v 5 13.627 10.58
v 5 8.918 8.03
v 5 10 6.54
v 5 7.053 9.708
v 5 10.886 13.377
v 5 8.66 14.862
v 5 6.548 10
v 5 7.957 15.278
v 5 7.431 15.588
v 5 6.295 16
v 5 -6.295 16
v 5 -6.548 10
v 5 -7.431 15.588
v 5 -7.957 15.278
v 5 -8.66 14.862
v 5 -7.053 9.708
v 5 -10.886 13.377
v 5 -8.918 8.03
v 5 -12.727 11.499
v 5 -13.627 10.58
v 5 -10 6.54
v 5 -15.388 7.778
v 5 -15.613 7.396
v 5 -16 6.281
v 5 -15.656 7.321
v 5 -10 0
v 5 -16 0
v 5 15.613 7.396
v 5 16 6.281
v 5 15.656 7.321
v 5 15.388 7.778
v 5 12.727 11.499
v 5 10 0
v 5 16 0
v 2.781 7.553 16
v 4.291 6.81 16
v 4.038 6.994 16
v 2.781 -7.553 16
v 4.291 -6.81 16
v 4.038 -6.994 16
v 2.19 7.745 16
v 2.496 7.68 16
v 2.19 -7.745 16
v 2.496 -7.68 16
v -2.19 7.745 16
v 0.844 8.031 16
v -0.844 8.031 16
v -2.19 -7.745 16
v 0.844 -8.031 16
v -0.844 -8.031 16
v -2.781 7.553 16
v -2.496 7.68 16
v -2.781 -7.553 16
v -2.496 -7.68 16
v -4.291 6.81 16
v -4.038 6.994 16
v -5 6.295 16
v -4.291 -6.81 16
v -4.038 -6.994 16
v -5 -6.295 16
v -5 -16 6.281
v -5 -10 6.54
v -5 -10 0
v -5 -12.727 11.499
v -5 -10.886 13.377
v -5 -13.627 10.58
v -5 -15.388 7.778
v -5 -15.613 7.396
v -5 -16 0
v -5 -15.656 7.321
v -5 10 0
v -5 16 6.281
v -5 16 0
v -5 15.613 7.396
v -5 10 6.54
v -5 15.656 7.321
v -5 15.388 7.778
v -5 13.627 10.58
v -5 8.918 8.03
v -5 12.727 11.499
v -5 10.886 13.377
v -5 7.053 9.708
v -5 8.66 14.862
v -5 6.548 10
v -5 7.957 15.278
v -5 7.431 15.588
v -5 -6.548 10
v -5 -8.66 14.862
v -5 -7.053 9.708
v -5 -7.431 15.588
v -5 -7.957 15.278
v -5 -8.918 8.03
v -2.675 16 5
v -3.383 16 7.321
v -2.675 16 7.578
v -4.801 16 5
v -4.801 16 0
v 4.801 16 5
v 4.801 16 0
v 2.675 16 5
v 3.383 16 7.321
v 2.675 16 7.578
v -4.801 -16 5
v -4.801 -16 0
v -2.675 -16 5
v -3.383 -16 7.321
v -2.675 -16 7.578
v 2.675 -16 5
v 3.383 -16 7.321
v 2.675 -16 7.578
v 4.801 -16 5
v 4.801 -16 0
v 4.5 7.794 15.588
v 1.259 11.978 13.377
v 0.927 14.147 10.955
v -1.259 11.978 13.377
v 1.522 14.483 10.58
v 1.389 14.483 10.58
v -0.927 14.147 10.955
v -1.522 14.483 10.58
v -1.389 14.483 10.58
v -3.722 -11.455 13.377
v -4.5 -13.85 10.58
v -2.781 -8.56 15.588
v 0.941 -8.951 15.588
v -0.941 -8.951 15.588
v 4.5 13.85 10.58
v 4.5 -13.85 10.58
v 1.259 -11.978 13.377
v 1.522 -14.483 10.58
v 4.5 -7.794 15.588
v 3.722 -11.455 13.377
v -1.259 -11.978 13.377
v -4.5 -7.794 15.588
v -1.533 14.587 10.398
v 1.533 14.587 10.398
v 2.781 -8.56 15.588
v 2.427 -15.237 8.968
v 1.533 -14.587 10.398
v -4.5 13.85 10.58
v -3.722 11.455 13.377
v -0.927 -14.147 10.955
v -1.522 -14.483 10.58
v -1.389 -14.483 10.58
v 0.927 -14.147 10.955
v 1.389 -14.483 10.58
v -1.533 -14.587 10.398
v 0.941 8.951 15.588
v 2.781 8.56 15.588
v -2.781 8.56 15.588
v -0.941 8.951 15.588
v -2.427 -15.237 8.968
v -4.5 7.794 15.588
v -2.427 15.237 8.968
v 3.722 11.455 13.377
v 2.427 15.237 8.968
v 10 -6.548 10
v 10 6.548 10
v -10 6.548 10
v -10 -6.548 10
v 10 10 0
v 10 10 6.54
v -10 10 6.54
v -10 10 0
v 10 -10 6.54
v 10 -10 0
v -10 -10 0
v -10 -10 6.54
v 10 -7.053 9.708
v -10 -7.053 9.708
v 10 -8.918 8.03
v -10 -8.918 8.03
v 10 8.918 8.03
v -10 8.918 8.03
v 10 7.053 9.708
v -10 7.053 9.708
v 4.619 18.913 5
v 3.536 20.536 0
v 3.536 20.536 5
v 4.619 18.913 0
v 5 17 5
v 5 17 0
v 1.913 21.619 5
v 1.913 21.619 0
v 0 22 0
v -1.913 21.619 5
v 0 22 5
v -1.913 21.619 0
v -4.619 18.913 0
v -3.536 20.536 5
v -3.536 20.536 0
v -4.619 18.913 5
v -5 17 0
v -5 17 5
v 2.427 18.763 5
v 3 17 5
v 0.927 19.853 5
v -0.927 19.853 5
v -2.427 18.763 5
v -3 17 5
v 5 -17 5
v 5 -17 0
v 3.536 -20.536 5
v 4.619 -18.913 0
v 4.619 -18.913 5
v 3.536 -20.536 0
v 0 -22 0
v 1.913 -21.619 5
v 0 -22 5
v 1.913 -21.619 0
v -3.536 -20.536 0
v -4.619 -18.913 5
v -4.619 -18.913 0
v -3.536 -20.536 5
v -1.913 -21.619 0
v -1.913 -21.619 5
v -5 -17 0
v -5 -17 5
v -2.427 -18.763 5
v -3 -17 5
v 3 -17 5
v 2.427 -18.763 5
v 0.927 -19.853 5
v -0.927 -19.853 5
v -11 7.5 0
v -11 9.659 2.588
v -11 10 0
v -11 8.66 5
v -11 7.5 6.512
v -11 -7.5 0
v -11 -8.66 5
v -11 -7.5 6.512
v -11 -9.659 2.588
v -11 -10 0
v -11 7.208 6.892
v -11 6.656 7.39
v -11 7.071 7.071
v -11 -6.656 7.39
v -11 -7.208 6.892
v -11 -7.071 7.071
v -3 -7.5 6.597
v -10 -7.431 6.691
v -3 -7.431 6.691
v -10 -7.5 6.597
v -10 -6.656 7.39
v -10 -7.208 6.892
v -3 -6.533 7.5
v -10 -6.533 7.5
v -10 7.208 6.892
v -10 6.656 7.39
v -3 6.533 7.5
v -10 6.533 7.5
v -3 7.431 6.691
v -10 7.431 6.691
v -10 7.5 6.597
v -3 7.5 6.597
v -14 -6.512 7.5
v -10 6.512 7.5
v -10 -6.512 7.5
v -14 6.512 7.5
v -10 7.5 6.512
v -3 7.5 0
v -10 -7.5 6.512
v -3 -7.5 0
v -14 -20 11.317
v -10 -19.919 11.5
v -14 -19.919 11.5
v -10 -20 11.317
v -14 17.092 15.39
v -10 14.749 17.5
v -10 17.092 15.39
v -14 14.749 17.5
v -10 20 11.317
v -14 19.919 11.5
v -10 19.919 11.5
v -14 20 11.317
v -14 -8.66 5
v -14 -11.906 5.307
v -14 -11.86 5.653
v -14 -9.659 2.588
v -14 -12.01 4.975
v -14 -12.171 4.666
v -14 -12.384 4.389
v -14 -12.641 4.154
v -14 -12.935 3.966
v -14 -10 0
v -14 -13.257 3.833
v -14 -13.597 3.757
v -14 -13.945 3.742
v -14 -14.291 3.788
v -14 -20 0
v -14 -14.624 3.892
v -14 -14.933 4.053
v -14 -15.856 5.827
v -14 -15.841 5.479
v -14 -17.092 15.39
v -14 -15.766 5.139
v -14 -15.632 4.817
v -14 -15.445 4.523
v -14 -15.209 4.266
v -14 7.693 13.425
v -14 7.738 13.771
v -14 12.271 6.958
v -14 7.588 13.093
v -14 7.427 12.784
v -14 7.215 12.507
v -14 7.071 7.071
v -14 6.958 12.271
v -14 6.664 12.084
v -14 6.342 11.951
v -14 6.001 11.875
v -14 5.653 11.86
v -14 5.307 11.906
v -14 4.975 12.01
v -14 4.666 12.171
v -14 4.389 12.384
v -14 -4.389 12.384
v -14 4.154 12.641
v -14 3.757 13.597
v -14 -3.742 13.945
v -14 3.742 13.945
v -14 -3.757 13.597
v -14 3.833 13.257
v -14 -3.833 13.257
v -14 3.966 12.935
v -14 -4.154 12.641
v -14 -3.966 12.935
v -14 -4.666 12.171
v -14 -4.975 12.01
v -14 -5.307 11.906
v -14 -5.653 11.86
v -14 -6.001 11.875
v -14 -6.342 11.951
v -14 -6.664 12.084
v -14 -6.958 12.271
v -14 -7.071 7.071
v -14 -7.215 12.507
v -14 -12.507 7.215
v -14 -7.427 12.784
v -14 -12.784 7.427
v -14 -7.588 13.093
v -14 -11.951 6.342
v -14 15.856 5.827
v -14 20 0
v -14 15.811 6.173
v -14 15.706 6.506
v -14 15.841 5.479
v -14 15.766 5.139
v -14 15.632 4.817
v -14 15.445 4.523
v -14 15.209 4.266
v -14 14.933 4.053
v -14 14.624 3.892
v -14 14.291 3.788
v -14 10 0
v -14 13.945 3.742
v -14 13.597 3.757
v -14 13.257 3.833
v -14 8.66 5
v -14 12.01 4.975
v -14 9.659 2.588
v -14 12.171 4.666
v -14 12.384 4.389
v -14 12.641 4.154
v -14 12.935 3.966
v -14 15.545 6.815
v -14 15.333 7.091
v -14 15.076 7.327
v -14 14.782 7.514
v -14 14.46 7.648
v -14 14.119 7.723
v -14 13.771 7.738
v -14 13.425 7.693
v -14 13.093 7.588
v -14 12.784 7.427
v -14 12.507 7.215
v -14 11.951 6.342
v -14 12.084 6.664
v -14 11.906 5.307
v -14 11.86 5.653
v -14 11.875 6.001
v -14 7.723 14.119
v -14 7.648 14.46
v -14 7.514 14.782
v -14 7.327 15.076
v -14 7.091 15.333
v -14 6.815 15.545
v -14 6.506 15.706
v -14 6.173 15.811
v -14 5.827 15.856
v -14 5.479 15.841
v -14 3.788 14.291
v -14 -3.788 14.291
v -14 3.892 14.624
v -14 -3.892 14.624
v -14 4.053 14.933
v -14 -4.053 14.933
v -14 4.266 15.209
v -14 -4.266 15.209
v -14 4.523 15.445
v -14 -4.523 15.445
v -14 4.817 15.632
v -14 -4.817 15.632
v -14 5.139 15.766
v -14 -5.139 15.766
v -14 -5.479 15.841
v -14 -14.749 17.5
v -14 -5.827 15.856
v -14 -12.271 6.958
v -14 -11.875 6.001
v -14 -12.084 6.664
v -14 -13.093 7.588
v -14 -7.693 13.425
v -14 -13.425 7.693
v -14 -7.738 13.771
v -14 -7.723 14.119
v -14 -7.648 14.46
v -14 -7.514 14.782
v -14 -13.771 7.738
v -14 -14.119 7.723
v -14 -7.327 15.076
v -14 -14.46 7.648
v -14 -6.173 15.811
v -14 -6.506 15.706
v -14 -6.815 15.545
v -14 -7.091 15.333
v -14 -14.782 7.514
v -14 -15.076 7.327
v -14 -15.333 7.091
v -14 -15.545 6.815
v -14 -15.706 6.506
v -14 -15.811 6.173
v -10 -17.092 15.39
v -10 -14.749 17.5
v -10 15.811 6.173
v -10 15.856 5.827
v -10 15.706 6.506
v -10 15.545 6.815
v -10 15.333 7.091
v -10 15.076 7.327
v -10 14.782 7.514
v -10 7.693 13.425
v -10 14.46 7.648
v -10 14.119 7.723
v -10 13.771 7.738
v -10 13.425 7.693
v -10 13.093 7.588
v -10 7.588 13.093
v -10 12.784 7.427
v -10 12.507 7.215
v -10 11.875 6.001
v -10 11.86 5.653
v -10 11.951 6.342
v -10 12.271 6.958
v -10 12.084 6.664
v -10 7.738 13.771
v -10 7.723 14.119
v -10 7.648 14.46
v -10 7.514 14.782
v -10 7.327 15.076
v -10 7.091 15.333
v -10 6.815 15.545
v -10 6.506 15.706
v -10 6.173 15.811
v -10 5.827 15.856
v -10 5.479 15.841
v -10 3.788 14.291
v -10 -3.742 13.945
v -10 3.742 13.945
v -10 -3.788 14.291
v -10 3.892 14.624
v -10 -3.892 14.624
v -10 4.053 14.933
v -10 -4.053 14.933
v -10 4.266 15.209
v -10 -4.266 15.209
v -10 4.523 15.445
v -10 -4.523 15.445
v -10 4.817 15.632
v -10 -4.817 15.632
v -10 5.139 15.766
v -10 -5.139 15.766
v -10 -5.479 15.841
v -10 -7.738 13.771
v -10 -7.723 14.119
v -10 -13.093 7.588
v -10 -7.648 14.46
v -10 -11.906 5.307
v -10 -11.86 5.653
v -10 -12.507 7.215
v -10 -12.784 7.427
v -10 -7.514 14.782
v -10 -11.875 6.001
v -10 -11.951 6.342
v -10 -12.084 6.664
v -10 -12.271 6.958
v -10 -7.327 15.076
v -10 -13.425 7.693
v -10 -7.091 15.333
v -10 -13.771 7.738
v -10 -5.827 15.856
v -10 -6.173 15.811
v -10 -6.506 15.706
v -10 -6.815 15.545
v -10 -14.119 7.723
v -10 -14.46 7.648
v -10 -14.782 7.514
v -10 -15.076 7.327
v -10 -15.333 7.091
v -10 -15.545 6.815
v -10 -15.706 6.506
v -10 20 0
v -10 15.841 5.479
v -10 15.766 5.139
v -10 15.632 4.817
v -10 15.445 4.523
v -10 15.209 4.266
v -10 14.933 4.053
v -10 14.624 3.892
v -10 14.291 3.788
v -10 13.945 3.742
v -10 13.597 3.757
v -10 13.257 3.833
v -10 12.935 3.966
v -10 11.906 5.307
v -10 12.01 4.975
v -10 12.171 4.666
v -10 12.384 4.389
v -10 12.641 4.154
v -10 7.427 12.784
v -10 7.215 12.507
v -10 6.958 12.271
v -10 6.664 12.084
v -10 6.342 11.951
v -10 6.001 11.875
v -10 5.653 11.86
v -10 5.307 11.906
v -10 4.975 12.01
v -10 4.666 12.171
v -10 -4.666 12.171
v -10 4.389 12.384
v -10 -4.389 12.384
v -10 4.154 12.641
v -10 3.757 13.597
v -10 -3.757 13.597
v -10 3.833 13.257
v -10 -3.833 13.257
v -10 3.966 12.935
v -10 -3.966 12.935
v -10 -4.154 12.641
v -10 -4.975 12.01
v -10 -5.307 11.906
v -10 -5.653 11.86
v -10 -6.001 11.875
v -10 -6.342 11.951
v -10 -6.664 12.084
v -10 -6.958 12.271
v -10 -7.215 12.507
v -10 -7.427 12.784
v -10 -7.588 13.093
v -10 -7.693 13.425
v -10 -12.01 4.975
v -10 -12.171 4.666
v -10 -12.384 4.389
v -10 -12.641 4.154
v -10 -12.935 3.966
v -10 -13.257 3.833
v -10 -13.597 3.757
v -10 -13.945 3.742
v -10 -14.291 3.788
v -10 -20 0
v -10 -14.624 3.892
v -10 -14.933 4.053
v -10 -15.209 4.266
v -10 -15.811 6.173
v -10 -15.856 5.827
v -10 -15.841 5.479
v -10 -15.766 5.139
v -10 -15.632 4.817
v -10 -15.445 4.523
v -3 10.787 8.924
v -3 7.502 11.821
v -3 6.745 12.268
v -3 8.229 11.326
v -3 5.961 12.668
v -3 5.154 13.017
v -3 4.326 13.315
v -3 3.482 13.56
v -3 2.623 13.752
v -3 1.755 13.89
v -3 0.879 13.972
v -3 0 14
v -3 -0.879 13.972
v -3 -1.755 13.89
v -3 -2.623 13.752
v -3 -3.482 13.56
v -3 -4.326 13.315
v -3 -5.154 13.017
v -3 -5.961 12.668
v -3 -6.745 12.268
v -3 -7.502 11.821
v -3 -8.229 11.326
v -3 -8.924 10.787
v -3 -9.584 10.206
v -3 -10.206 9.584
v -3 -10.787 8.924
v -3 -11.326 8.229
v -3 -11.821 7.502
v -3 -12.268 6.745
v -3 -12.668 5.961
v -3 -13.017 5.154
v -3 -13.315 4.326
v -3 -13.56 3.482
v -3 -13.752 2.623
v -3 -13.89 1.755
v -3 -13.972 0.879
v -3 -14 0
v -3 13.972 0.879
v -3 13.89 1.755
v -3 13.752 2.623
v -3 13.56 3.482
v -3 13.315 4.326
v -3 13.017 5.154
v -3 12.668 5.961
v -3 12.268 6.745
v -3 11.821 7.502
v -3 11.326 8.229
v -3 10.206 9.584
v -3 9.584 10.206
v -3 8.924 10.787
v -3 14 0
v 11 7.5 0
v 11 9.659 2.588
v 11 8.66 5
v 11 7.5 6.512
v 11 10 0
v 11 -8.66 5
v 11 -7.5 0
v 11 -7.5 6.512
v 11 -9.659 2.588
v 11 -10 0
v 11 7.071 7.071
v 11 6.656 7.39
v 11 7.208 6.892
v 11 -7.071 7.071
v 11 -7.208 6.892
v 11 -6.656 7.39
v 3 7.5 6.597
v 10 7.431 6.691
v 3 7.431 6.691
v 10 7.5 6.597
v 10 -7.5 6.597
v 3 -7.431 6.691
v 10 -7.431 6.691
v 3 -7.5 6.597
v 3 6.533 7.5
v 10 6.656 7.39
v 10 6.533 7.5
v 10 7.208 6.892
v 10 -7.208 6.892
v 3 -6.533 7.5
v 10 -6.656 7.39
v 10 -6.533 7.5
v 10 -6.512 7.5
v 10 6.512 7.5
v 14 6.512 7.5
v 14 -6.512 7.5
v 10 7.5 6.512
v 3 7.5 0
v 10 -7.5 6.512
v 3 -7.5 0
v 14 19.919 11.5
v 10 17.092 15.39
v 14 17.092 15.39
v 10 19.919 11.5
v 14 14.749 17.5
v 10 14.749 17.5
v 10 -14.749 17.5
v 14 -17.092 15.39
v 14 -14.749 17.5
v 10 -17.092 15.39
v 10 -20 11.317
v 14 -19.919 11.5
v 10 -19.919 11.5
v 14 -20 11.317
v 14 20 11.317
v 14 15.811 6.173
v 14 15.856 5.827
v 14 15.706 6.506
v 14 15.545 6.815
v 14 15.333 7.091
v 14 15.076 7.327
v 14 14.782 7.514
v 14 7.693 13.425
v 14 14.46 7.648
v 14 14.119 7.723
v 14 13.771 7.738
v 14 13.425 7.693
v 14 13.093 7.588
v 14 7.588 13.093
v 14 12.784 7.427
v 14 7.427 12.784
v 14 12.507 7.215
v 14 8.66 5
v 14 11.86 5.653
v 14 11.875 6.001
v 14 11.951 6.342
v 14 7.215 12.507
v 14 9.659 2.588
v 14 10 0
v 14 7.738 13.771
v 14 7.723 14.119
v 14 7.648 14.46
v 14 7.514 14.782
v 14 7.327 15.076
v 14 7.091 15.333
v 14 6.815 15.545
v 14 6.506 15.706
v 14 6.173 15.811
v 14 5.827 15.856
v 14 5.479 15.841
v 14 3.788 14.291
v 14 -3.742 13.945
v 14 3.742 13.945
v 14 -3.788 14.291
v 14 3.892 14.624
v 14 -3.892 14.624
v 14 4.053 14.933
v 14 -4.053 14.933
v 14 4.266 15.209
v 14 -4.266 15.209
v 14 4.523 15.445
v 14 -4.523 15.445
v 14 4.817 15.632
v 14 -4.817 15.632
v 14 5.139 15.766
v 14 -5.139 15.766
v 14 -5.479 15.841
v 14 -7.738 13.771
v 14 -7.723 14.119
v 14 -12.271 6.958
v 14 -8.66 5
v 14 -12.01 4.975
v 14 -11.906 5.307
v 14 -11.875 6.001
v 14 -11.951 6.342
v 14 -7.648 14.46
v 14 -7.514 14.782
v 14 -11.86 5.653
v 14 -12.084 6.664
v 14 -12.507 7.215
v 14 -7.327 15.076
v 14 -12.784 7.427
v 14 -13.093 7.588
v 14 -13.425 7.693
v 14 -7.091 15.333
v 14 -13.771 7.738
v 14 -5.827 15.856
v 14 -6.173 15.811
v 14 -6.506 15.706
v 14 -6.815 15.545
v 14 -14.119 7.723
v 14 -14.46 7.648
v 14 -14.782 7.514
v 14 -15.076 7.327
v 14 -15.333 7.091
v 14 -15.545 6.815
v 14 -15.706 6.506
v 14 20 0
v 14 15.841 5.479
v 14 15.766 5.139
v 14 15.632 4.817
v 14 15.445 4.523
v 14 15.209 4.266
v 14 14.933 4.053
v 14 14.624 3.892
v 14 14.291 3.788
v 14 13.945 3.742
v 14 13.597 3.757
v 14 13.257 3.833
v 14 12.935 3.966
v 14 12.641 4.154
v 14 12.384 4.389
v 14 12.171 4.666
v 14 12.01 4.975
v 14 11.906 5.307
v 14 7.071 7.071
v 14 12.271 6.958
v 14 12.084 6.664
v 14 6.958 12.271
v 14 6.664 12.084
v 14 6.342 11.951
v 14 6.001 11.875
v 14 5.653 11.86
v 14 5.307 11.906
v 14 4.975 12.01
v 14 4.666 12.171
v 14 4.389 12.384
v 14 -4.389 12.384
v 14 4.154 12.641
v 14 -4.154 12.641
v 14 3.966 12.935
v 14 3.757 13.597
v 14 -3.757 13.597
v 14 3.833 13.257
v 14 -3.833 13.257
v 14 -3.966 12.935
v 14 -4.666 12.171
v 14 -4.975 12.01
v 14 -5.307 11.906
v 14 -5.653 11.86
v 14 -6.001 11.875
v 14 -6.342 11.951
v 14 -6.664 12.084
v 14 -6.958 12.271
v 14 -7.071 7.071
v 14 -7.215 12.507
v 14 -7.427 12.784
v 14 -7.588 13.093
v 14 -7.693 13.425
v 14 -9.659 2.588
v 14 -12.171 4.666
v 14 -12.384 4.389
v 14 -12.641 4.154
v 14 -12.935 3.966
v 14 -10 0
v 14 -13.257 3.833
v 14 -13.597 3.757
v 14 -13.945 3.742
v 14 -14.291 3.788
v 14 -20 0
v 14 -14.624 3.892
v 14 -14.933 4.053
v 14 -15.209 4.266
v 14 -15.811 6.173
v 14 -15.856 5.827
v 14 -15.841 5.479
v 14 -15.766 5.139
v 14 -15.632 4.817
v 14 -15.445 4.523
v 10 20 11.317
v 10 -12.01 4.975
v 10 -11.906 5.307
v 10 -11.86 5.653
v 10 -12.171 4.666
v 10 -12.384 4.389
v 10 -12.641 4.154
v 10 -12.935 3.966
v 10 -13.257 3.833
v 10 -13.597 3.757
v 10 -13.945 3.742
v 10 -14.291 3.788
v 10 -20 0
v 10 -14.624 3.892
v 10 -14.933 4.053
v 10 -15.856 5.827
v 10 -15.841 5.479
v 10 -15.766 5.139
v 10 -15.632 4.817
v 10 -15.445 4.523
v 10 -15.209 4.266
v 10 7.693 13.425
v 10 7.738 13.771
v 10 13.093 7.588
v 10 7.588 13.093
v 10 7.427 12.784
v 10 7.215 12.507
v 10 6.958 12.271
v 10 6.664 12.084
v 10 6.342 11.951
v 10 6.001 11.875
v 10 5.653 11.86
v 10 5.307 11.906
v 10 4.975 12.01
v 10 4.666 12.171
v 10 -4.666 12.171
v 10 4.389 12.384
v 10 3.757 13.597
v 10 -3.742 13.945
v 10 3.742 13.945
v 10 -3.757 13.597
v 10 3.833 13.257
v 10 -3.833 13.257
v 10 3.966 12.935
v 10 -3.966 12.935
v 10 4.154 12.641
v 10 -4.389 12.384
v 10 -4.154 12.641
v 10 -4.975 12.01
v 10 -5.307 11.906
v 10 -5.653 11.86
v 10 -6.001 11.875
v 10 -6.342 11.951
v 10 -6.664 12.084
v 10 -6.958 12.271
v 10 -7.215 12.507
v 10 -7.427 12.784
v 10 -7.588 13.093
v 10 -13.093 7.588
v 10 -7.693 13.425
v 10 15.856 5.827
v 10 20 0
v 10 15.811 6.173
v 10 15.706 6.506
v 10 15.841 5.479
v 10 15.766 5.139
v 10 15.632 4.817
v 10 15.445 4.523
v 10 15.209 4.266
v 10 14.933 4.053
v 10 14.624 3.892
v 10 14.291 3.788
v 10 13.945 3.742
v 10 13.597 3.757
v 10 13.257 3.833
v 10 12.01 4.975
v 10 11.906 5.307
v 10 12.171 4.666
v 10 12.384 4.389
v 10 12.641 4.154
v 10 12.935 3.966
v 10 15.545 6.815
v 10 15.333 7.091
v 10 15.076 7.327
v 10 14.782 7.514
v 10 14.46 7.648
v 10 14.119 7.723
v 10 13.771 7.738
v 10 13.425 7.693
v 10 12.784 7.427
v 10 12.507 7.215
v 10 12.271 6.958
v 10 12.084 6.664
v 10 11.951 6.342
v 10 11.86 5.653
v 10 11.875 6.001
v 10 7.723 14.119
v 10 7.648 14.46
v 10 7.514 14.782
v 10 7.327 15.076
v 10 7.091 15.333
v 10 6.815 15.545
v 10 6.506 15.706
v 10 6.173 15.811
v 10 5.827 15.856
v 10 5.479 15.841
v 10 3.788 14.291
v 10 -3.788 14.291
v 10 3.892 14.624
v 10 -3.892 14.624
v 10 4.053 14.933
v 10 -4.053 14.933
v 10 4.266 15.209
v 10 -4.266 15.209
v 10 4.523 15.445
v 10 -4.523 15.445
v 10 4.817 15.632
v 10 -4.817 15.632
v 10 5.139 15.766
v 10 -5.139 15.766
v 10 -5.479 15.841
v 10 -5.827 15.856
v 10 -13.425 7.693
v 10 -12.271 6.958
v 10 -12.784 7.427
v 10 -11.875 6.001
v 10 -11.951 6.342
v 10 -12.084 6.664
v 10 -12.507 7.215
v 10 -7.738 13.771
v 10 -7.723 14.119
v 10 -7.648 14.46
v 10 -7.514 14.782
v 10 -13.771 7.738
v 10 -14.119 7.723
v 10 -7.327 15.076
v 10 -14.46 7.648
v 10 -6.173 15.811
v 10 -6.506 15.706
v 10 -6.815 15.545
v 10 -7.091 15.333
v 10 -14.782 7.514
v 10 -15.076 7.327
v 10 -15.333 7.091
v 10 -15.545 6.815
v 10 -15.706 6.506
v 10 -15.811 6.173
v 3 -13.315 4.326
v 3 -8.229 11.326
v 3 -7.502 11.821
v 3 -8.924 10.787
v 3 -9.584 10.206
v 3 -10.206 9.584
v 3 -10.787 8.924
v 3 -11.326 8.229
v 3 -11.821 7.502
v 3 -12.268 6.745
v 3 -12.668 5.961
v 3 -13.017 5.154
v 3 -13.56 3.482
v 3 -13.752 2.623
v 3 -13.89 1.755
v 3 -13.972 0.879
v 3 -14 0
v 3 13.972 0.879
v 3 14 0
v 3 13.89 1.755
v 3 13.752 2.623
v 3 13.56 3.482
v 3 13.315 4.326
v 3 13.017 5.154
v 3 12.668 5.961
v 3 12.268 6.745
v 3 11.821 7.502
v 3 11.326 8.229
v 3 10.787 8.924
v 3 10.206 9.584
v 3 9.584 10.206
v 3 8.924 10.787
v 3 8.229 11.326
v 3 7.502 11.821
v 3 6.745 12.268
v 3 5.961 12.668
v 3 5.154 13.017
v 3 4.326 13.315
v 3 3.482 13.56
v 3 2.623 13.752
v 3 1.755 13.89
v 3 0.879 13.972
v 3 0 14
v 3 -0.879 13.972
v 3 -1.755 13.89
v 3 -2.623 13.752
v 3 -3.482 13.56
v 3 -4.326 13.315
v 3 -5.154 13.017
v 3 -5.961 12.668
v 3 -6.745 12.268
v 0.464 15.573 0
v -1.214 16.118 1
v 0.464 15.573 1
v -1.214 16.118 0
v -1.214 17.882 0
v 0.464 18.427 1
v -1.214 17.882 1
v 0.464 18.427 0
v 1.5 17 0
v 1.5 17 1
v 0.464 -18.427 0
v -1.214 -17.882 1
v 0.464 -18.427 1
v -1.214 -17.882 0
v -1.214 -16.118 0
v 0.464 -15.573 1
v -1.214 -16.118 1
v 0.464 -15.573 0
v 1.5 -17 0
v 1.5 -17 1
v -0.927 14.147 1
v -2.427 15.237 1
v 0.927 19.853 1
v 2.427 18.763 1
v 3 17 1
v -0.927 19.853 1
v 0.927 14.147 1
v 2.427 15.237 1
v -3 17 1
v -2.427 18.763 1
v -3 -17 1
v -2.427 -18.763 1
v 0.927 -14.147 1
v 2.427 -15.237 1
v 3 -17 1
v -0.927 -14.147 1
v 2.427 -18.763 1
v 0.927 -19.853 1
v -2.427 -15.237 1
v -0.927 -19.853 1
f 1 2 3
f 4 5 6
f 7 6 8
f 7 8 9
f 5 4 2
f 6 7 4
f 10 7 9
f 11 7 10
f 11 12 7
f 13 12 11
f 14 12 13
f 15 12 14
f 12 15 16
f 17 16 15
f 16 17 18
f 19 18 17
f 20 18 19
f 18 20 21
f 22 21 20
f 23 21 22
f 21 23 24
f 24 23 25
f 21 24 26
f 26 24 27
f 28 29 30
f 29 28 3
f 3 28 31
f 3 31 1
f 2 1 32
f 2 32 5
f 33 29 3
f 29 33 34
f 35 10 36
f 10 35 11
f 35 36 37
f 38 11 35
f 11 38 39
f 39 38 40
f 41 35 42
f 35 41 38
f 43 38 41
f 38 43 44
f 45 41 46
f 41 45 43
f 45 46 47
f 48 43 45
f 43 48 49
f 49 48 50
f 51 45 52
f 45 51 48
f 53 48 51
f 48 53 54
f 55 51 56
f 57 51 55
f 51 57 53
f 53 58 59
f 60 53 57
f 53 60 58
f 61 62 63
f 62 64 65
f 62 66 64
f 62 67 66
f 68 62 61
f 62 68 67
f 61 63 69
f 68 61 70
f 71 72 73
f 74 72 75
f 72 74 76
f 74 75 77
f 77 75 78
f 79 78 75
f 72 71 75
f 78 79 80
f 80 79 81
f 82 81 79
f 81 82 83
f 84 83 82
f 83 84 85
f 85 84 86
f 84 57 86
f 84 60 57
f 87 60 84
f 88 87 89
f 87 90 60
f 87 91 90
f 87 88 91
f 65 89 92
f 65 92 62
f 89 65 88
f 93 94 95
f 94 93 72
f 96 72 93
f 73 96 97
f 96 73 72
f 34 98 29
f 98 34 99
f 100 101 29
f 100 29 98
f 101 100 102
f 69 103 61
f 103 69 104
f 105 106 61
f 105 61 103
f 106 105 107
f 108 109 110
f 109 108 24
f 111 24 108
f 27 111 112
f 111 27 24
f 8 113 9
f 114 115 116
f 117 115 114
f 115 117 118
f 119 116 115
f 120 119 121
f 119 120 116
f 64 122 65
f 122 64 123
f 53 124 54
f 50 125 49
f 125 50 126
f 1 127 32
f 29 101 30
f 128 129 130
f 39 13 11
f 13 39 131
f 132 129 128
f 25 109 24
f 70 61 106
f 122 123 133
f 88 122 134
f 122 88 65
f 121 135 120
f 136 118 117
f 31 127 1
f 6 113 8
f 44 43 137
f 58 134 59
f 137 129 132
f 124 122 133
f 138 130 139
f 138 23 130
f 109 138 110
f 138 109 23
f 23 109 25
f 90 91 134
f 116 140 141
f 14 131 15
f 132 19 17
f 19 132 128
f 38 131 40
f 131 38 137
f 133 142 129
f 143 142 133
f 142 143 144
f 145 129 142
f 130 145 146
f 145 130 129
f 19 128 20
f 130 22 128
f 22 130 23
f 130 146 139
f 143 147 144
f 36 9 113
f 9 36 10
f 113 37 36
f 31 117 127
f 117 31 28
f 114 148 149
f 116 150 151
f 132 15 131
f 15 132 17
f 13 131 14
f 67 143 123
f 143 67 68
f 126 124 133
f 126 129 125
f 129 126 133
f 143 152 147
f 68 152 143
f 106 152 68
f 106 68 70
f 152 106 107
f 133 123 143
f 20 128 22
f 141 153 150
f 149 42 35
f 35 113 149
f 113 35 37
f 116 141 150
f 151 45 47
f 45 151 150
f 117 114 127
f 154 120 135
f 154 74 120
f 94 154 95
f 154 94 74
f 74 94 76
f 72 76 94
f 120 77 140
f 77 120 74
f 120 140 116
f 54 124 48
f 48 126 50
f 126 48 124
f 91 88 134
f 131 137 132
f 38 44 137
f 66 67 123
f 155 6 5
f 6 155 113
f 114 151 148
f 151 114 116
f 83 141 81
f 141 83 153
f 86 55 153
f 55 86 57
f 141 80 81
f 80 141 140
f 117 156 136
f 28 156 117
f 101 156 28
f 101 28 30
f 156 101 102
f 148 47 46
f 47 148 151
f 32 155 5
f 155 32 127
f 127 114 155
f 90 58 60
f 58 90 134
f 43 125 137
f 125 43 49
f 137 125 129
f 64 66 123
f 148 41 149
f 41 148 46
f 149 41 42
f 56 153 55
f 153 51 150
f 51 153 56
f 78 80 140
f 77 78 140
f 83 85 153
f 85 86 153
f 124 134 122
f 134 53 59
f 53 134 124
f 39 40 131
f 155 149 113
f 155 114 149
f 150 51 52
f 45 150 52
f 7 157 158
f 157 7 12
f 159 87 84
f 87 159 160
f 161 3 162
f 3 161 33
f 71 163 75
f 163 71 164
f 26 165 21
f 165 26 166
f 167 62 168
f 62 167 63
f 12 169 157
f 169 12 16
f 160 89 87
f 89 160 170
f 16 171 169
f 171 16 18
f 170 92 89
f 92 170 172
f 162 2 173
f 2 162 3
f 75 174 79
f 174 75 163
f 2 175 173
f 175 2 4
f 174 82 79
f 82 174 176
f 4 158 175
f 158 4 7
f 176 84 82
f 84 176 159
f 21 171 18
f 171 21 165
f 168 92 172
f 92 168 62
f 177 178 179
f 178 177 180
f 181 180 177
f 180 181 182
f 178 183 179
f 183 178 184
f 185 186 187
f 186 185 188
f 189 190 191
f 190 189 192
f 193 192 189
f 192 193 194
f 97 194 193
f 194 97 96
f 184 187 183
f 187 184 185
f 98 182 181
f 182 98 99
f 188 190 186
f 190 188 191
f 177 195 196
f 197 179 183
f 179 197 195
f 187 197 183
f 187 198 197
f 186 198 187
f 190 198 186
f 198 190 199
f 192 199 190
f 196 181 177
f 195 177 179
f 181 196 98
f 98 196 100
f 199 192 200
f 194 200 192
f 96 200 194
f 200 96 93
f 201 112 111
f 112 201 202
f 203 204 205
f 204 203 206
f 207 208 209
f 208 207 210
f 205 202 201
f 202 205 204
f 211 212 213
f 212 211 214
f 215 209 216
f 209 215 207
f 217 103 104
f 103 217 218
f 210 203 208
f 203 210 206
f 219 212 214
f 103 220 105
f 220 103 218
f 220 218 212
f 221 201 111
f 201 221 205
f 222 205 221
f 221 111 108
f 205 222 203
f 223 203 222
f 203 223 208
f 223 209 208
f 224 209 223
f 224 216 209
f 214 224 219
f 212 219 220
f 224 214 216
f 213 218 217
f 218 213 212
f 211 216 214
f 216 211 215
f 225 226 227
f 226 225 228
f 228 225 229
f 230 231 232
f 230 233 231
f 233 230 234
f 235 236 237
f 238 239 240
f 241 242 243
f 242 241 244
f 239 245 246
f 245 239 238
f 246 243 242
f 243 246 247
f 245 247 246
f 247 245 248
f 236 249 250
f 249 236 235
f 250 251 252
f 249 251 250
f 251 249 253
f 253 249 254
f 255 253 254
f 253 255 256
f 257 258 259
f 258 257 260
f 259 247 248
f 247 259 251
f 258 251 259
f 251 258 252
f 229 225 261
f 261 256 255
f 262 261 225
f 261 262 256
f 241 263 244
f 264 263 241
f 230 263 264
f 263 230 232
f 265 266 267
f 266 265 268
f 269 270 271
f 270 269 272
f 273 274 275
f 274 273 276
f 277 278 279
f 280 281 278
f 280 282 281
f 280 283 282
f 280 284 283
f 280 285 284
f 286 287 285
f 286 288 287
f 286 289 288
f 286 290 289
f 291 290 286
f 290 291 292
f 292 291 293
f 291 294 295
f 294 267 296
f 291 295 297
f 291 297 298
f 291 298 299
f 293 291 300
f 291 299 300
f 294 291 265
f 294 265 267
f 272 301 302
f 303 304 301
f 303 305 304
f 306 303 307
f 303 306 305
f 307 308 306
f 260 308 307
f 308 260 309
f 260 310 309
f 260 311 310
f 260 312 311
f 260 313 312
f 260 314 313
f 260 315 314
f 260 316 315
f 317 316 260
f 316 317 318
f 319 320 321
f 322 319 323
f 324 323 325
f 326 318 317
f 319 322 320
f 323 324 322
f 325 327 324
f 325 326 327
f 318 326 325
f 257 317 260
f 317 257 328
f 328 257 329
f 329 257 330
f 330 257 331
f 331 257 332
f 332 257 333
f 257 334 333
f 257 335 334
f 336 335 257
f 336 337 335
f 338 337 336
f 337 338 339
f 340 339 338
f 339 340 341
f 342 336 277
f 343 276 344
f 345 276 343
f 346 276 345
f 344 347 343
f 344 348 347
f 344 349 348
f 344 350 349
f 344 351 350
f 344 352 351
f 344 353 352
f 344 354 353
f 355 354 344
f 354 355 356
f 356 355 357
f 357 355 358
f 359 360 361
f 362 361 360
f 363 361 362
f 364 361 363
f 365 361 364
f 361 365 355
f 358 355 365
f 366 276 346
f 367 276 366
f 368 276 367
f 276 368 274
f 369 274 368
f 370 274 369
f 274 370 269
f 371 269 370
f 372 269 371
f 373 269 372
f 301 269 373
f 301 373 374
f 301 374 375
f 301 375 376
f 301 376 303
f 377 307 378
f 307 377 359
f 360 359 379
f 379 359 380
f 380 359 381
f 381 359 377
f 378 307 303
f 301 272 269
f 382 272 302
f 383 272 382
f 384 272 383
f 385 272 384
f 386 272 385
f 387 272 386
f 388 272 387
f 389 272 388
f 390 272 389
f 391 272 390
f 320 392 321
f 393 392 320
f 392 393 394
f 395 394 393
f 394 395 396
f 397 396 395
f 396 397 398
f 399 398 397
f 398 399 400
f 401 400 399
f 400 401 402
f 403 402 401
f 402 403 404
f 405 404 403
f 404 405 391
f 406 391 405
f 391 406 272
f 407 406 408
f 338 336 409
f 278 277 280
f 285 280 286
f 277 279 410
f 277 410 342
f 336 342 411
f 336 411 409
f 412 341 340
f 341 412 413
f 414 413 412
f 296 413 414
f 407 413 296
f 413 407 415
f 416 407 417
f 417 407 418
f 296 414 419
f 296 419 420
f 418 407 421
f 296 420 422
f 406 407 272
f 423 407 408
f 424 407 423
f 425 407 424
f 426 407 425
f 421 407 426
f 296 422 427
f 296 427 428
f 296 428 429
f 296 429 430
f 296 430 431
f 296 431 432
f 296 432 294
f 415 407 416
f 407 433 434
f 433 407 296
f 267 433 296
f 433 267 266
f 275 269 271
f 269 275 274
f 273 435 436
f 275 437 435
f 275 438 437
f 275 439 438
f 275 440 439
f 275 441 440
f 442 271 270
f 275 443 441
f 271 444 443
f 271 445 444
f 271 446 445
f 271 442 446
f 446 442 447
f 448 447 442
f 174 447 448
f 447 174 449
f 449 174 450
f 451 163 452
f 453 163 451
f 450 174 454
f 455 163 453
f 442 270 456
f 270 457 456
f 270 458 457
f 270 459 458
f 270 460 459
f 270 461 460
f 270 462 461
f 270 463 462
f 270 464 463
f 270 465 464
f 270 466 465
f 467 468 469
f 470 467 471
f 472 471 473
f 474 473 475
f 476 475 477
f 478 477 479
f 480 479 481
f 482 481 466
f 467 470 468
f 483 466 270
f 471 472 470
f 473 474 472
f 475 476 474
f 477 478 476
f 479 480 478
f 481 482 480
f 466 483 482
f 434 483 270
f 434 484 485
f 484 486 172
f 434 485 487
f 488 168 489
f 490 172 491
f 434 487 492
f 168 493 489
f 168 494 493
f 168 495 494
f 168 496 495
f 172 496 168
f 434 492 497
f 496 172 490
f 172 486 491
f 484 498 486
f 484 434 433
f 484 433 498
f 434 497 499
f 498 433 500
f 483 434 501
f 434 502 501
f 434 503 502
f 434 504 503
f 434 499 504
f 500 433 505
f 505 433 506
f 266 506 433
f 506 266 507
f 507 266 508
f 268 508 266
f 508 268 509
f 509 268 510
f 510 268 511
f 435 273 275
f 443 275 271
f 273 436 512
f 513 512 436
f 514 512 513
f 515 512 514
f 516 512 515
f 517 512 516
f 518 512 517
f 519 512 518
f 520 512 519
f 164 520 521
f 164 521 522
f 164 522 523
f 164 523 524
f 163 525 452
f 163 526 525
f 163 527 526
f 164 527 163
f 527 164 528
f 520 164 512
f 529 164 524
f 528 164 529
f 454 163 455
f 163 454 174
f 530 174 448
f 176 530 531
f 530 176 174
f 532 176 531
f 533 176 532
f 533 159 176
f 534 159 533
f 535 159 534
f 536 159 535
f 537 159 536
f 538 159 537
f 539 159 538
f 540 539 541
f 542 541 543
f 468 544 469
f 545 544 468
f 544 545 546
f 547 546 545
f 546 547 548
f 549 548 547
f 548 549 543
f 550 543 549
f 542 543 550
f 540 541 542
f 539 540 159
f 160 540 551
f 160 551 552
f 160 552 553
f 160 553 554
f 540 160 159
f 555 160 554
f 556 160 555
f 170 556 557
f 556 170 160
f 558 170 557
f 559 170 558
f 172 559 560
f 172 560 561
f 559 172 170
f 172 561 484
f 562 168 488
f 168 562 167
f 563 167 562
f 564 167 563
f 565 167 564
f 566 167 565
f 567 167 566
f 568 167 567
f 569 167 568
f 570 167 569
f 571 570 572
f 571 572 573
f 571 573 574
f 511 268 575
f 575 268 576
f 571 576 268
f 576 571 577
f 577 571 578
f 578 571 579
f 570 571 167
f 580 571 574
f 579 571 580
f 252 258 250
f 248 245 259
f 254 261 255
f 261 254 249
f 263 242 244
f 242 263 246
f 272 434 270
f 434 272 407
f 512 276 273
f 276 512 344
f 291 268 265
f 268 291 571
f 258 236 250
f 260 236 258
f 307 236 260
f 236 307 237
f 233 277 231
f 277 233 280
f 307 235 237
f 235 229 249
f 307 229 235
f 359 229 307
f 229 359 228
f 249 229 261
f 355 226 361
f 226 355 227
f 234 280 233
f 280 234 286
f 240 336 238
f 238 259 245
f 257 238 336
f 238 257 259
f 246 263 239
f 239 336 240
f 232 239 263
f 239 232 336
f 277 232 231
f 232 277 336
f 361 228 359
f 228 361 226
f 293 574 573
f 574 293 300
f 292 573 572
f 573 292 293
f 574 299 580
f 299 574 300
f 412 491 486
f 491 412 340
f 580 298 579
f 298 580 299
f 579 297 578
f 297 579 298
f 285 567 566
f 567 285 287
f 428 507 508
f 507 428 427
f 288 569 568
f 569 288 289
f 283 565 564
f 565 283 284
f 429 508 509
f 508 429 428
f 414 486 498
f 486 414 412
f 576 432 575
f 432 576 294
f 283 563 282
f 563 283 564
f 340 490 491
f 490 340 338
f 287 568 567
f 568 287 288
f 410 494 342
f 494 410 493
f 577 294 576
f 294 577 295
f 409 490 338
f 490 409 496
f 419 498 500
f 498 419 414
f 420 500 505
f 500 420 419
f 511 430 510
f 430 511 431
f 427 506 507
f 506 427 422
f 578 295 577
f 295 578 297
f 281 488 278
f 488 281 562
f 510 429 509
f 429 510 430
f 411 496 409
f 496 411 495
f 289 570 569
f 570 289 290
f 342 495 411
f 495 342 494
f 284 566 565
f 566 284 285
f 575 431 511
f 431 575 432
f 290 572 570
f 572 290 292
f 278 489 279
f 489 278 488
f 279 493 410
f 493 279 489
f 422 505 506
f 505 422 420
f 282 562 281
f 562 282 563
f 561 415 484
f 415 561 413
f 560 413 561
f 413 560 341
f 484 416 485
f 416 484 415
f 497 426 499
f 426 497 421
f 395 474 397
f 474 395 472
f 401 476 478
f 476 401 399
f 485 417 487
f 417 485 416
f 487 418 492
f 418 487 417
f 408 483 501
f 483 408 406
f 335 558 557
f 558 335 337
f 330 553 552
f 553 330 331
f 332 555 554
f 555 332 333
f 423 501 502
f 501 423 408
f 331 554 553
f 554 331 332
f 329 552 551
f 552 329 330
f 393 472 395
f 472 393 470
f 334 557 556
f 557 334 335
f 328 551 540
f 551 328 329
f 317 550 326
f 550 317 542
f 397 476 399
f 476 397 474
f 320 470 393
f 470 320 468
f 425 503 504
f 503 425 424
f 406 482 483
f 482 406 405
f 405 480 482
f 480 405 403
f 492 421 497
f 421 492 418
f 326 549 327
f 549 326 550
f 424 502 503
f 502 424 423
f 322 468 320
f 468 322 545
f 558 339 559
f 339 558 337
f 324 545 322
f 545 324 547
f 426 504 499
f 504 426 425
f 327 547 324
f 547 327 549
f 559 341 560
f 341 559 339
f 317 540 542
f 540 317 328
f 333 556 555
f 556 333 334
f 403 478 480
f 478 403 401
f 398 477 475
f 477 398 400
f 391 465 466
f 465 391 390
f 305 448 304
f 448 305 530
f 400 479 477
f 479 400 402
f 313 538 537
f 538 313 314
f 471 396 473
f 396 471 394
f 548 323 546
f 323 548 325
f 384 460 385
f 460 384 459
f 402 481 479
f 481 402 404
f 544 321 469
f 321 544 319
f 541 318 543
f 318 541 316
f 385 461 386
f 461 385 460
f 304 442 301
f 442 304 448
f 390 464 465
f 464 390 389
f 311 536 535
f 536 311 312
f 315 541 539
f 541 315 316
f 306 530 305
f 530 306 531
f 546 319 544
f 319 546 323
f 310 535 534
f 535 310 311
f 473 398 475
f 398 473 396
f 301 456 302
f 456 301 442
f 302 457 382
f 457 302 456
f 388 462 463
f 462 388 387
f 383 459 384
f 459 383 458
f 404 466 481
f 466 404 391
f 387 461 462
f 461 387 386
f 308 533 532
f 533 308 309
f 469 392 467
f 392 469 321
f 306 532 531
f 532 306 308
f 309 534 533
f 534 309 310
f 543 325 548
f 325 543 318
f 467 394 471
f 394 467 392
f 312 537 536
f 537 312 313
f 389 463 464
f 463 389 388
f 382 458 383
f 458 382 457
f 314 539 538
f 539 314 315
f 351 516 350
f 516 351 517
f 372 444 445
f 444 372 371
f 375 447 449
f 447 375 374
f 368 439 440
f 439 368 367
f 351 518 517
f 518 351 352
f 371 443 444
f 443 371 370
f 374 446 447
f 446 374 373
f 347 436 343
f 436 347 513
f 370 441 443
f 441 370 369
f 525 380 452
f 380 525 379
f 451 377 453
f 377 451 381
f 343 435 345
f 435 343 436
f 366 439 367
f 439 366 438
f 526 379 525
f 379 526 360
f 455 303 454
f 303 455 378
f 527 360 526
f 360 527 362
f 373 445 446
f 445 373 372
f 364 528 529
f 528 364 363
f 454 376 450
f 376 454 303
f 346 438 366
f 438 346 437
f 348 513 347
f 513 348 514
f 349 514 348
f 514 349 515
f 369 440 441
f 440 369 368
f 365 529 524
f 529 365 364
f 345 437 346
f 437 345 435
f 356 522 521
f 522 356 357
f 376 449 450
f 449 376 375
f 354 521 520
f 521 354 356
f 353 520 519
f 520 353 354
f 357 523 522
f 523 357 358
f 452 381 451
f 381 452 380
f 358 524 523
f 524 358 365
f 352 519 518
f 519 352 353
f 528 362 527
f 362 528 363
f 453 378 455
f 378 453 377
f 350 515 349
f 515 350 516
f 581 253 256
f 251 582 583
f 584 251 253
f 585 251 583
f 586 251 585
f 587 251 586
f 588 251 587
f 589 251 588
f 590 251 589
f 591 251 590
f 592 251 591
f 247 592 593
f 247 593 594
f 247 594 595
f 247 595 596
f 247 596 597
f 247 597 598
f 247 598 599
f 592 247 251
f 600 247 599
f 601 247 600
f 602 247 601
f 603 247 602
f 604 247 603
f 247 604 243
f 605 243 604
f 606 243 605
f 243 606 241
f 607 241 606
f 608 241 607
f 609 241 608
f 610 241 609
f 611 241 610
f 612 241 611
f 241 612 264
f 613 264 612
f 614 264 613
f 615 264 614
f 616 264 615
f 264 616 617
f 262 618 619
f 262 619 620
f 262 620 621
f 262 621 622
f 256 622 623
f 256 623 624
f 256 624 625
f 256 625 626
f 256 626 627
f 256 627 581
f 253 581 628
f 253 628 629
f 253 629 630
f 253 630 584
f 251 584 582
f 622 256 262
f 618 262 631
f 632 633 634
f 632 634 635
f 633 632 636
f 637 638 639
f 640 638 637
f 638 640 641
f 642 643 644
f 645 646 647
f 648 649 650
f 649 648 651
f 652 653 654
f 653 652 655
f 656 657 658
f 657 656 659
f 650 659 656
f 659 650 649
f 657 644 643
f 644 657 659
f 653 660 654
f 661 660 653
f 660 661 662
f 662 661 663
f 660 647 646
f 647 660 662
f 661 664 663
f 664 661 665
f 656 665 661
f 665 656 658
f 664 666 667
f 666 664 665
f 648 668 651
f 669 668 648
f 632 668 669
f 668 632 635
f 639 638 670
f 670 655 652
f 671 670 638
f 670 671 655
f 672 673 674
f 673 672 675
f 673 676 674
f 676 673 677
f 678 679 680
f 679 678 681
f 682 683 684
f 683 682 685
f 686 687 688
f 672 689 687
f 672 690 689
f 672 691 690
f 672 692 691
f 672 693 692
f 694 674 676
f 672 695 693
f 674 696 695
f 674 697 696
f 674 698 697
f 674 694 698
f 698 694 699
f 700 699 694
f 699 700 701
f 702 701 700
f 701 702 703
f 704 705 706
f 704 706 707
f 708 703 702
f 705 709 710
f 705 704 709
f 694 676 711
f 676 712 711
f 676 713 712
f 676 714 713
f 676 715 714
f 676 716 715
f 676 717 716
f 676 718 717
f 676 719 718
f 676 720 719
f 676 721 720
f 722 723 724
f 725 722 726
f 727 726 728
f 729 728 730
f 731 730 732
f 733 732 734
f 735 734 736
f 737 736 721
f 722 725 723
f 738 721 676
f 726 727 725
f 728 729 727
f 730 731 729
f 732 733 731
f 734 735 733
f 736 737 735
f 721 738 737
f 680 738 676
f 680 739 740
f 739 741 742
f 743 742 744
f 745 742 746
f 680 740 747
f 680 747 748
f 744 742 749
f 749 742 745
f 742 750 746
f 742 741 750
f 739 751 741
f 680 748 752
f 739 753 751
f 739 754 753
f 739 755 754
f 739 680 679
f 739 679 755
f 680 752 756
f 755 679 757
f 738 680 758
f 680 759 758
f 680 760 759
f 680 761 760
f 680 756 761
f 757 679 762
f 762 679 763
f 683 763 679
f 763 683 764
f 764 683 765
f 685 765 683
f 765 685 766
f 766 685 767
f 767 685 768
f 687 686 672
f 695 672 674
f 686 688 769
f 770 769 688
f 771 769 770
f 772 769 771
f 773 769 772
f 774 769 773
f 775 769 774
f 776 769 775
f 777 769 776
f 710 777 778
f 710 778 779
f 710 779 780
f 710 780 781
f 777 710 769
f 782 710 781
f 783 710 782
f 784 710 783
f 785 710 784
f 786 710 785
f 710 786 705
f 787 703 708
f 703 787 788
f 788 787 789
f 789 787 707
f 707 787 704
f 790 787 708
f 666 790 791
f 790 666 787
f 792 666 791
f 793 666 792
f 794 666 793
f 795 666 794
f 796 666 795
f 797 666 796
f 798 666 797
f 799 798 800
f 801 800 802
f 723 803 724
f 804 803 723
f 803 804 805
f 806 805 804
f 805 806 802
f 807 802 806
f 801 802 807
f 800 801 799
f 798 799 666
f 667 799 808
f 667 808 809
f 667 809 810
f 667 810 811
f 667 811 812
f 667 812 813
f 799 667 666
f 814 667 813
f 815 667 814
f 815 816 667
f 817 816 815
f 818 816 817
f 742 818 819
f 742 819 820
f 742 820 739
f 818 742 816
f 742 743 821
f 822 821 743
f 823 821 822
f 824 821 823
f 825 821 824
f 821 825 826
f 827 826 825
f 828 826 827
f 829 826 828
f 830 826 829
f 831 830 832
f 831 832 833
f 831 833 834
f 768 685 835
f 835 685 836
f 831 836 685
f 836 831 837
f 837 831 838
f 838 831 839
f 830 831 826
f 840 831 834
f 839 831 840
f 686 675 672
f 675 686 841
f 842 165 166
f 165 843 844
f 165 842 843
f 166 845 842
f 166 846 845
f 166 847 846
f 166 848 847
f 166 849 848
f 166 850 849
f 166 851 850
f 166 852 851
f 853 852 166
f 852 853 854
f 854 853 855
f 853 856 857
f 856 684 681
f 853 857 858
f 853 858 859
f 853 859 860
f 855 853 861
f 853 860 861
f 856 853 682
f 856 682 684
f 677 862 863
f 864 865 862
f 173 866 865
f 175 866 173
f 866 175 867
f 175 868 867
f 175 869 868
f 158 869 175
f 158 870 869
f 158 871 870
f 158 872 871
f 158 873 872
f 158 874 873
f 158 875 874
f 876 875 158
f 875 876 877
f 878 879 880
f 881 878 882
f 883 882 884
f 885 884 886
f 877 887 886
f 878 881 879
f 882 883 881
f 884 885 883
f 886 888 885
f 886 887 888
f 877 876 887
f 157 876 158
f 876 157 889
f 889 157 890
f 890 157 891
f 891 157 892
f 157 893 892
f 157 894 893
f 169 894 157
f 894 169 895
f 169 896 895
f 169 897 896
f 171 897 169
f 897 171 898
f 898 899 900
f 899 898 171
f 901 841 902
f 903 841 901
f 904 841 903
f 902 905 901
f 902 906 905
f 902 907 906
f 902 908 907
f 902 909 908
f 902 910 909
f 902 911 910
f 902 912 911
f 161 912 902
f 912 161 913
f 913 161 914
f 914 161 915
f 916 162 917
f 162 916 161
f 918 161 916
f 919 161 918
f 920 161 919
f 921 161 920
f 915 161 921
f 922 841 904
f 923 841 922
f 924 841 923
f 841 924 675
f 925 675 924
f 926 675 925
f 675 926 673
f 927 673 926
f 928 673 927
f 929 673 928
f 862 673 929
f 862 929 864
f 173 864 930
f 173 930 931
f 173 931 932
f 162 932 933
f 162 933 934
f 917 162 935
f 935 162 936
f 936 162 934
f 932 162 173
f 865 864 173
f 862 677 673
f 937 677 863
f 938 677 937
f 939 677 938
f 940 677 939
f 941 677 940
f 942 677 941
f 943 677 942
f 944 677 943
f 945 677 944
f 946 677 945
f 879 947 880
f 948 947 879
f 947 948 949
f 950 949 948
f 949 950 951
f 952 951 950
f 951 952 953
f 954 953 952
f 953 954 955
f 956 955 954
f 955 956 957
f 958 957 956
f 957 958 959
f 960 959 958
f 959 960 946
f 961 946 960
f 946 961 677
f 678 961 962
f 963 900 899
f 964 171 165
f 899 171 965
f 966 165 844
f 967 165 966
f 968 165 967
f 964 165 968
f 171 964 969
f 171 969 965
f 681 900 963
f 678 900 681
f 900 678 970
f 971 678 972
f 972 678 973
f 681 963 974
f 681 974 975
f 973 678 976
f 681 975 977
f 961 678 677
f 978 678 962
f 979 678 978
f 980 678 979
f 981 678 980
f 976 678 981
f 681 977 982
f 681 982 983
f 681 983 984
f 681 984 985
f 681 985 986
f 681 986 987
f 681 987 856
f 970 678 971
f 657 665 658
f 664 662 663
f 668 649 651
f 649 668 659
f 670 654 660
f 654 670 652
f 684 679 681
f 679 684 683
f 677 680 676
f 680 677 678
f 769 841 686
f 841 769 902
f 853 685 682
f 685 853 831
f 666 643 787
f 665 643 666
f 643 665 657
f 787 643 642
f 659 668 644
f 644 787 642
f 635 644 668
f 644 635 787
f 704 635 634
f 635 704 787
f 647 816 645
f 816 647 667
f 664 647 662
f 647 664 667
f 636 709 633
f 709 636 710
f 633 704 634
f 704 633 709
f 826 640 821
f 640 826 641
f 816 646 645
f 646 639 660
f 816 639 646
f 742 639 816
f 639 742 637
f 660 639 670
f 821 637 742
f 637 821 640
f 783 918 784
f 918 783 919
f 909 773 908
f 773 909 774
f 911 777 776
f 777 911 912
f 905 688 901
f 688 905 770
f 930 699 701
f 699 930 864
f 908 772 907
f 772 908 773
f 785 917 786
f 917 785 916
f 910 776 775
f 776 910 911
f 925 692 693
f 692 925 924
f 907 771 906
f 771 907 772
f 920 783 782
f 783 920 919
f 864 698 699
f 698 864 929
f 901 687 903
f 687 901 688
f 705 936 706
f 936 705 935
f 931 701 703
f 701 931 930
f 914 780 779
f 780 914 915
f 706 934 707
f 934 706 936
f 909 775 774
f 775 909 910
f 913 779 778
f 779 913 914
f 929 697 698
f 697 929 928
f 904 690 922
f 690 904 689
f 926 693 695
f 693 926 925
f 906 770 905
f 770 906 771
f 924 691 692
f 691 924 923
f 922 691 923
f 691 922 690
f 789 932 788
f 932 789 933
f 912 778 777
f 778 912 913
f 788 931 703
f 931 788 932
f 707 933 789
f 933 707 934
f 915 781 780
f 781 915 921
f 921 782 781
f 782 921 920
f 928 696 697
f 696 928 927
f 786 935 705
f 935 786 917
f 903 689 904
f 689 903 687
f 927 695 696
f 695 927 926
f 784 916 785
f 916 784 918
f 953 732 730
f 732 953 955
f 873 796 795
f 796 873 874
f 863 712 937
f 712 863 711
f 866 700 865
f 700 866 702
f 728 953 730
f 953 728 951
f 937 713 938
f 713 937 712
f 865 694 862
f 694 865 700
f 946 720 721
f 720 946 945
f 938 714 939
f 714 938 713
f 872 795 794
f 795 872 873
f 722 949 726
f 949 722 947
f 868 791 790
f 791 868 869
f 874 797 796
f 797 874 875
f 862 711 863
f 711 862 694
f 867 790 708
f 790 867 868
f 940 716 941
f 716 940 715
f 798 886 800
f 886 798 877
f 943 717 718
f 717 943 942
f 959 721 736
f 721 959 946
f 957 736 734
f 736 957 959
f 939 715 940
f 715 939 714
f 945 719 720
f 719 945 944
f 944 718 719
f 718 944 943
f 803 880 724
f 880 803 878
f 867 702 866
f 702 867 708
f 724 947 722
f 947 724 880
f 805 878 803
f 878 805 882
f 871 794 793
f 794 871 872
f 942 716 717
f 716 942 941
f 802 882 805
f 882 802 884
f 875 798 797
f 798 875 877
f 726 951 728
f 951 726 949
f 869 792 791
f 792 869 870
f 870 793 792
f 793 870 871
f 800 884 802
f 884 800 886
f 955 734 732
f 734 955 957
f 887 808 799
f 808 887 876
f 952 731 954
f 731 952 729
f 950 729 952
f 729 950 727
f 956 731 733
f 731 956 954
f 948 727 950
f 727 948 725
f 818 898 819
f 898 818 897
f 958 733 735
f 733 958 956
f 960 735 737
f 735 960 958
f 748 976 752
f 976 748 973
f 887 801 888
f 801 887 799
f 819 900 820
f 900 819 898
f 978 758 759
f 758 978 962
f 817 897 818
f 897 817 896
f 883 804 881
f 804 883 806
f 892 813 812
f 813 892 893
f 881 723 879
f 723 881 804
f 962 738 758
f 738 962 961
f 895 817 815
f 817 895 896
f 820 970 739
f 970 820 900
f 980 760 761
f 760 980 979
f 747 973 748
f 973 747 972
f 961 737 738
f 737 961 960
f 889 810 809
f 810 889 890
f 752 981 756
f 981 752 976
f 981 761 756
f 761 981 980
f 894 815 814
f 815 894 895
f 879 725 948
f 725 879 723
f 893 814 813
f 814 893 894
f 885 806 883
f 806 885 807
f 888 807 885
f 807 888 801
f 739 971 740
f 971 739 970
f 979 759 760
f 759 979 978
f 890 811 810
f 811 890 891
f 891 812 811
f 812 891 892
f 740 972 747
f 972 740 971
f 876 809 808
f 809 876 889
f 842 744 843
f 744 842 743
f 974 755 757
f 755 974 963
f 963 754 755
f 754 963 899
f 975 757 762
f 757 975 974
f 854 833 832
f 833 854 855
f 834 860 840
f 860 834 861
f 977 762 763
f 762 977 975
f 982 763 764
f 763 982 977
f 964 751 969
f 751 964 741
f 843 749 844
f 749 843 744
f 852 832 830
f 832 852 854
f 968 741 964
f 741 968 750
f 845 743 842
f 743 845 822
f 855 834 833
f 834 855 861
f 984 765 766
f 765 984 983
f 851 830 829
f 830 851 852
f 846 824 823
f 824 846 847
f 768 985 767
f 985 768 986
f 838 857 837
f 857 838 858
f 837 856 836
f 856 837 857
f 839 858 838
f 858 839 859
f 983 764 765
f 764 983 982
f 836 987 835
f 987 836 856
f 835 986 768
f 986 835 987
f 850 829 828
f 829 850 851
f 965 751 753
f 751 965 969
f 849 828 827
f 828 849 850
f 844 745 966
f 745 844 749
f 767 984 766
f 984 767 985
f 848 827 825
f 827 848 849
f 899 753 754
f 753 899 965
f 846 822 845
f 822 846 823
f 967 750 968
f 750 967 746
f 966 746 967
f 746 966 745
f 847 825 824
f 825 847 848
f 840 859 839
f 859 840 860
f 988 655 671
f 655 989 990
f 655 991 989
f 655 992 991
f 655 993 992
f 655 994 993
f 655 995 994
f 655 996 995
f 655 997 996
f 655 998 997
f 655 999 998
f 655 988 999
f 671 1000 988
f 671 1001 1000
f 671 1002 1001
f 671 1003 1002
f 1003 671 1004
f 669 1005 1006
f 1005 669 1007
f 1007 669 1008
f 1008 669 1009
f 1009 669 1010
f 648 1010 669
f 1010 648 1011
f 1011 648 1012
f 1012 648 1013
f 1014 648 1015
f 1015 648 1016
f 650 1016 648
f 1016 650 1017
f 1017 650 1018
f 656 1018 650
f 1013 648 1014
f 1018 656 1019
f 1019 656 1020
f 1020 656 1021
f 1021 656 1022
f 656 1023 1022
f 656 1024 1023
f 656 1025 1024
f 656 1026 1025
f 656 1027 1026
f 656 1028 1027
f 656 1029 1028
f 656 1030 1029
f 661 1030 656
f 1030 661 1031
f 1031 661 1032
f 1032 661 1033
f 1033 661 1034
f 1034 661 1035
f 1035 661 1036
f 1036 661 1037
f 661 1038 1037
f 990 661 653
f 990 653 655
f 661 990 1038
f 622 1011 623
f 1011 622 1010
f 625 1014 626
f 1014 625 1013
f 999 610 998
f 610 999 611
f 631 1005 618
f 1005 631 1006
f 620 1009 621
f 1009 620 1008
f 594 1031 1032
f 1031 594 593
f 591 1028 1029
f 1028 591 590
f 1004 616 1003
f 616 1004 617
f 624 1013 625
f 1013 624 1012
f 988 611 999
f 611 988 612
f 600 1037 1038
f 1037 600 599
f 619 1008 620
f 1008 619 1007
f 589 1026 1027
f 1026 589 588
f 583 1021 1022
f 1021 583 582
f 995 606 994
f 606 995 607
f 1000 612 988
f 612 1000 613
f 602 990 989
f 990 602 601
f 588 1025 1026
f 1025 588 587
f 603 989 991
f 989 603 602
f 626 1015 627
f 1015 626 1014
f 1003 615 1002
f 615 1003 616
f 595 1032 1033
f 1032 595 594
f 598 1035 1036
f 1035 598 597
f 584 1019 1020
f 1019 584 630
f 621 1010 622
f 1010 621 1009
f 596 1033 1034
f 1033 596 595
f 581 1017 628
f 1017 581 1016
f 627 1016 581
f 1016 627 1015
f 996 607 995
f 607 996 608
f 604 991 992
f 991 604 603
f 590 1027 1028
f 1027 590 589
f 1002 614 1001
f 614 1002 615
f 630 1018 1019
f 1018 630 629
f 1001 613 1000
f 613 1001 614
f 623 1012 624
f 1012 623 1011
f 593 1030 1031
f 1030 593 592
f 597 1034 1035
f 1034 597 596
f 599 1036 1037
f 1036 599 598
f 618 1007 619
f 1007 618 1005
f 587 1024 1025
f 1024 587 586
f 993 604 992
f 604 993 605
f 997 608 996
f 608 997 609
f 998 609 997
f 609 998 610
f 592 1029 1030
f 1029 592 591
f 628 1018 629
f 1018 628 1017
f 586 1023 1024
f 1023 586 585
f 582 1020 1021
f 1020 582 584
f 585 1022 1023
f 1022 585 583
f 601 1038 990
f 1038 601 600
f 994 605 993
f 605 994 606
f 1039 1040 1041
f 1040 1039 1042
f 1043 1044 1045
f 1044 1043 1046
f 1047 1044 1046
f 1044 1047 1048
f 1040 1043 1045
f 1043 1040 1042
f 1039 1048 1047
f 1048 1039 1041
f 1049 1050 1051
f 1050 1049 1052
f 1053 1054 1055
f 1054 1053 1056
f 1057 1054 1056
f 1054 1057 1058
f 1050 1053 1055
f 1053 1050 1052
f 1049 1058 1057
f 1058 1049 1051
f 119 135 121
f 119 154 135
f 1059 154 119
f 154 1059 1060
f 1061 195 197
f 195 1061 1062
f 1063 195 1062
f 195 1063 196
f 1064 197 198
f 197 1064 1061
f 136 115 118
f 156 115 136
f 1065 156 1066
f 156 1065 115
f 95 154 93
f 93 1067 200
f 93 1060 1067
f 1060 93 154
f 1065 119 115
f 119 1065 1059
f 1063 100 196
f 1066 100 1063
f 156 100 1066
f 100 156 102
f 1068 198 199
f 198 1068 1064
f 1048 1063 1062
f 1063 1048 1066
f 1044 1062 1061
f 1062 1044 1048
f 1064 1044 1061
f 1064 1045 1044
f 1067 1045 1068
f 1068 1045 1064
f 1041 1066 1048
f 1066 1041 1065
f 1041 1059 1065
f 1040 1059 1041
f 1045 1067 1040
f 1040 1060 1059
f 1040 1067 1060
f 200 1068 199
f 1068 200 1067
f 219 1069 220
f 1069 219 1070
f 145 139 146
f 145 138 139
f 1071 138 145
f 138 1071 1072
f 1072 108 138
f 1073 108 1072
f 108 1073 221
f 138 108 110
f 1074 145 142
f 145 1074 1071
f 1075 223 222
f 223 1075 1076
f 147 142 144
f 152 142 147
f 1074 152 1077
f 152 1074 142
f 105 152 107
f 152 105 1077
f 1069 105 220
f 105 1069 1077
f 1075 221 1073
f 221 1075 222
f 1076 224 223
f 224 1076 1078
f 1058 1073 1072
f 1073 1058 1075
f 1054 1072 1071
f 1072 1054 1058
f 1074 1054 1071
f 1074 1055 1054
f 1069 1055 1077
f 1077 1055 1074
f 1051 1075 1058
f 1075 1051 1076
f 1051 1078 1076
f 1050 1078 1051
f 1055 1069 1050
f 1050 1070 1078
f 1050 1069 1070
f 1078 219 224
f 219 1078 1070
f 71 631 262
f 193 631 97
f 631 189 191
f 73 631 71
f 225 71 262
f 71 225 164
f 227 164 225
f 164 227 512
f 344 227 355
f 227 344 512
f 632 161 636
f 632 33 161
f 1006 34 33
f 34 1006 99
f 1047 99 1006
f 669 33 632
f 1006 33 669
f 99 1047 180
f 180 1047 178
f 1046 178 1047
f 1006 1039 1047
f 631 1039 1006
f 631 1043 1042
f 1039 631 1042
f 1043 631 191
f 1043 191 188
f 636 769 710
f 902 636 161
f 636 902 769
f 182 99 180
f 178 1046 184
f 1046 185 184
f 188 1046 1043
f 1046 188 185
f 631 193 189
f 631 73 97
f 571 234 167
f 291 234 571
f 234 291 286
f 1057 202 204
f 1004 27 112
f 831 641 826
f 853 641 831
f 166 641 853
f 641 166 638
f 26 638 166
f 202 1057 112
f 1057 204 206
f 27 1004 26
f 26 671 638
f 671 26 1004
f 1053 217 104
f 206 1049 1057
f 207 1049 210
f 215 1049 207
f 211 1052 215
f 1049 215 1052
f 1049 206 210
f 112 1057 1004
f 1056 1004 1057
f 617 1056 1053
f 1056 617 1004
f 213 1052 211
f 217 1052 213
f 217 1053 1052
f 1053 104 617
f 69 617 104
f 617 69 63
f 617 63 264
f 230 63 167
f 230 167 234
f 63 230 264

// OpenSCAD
// file: std_mechanical_object_flange3.scad
module flangeBody(){
	difference(){
		//tubeBody
		intersection(){
			translate([5,0,0]) rotate([0,90,0]) cylinder(h=12,r=12,center=true);
			translate([5,0,0]) cube(size=[20,20,20],center=true);
		}
		//throat
		intersection(){
			translate([5,0,0]) rotate([0,90,0]) cylinder(h=13,r=10,center=true);
			translate([5,0,0]) cube(size=[15,15,15],center=true);
		}
	}
}

module flangeFace(){
	difference(){
		union(){
			difference(){
				//flange
				intersection(){
					translate([12,0,0]) rotate([0,90,0]) cylinder(r=23,h=4,center=true);
					translate([12,0,0]) cube(size=[10,40,35],center=true);
				}
				//flangeThroat
				intersection(){
					translate([12,0,0]) rotate([0,90,0]) cylinder(r=10,h=5,$fn=24,center=true);
					translate([12,0,0]) cube(size=[10,20,15],center=true);
				}
			}
		}
		//tubeMountingHoles
		rotate([22.5,0,0]){
			for ( v = [0 : 8] ){
				rotate( v * 360 / 8, [1, 0, 0]){
					translate([12, 15, 0]){
						rotate([0,90,0]){
							cylinder(r=2,h=5,$fn=36,center=true);
						}
					}
				}
			}
		}
	}
}

module flange(){
	union(){
		flangeBody();
		flangeFace();
	}
}

flange();
// main file
use <std_mechanical_object_flange3.scad>

module passFilter(){
	translate ([0,0,0]) rotate([0,90,0]) color([0,.5,0]) cylinder(r=13,h=5,$fn=100,center=true);
}

module passFilterBody(){
	union(){
		difference(){
			//mainBody
			intersection(){
				cube(size=[10,32,32],center=true);
				sphere(r=18,center=true);
			}
			//laserPath
			intersection(){
				cube(size=[40,20,20],center=true);
				rotate([0,90,0]) cylinder(r=12,h=45,center=true);
			}
		}
		//screwHoles
		translate([0,17,0]) cylinder(r=5,h=10,center=true);
		translate([0,-17,0]) cylinder(r=5,h=10,center=true);
	}
			//flange
			rotate([0,180,0]){ 
				translate([0,0,0]){
					difference(){
						flange();
						cube(size=[6,24,24],center=true);
					}
				}
			}
			//flange
			rotate([0,0,0]){
				translate([0,0,0]){
					difference(){
						 flange();
						cube(size=[6,25,24],center=true);
					}
				}
			}
}

module passFilter_mount_top(){
	difference(){
		passFilterBody();
		//filterSlot
		translate ([0,0,0]) rotate([0,90,0]) cylinder(r=14,h=6,$fn=100,center=true);
		//screwHoles
		translate([0,17,-5]) cylinder(r=1.5,h=14,center=true);
		translate([0,-17,-5]) cylinder(r=1.5,h=14,center=true);

		translate([0,17,8]) cylinder(r=3,h=14,center=true);
		translate([0,-17,8]) cylinder(r=3,h=14,center=true);
		//bottomChop
		translate([0,0,-11]) cube(size=[50,50,22],center=true);
	}
}

//passFilter();
passFilter_mount_top();
